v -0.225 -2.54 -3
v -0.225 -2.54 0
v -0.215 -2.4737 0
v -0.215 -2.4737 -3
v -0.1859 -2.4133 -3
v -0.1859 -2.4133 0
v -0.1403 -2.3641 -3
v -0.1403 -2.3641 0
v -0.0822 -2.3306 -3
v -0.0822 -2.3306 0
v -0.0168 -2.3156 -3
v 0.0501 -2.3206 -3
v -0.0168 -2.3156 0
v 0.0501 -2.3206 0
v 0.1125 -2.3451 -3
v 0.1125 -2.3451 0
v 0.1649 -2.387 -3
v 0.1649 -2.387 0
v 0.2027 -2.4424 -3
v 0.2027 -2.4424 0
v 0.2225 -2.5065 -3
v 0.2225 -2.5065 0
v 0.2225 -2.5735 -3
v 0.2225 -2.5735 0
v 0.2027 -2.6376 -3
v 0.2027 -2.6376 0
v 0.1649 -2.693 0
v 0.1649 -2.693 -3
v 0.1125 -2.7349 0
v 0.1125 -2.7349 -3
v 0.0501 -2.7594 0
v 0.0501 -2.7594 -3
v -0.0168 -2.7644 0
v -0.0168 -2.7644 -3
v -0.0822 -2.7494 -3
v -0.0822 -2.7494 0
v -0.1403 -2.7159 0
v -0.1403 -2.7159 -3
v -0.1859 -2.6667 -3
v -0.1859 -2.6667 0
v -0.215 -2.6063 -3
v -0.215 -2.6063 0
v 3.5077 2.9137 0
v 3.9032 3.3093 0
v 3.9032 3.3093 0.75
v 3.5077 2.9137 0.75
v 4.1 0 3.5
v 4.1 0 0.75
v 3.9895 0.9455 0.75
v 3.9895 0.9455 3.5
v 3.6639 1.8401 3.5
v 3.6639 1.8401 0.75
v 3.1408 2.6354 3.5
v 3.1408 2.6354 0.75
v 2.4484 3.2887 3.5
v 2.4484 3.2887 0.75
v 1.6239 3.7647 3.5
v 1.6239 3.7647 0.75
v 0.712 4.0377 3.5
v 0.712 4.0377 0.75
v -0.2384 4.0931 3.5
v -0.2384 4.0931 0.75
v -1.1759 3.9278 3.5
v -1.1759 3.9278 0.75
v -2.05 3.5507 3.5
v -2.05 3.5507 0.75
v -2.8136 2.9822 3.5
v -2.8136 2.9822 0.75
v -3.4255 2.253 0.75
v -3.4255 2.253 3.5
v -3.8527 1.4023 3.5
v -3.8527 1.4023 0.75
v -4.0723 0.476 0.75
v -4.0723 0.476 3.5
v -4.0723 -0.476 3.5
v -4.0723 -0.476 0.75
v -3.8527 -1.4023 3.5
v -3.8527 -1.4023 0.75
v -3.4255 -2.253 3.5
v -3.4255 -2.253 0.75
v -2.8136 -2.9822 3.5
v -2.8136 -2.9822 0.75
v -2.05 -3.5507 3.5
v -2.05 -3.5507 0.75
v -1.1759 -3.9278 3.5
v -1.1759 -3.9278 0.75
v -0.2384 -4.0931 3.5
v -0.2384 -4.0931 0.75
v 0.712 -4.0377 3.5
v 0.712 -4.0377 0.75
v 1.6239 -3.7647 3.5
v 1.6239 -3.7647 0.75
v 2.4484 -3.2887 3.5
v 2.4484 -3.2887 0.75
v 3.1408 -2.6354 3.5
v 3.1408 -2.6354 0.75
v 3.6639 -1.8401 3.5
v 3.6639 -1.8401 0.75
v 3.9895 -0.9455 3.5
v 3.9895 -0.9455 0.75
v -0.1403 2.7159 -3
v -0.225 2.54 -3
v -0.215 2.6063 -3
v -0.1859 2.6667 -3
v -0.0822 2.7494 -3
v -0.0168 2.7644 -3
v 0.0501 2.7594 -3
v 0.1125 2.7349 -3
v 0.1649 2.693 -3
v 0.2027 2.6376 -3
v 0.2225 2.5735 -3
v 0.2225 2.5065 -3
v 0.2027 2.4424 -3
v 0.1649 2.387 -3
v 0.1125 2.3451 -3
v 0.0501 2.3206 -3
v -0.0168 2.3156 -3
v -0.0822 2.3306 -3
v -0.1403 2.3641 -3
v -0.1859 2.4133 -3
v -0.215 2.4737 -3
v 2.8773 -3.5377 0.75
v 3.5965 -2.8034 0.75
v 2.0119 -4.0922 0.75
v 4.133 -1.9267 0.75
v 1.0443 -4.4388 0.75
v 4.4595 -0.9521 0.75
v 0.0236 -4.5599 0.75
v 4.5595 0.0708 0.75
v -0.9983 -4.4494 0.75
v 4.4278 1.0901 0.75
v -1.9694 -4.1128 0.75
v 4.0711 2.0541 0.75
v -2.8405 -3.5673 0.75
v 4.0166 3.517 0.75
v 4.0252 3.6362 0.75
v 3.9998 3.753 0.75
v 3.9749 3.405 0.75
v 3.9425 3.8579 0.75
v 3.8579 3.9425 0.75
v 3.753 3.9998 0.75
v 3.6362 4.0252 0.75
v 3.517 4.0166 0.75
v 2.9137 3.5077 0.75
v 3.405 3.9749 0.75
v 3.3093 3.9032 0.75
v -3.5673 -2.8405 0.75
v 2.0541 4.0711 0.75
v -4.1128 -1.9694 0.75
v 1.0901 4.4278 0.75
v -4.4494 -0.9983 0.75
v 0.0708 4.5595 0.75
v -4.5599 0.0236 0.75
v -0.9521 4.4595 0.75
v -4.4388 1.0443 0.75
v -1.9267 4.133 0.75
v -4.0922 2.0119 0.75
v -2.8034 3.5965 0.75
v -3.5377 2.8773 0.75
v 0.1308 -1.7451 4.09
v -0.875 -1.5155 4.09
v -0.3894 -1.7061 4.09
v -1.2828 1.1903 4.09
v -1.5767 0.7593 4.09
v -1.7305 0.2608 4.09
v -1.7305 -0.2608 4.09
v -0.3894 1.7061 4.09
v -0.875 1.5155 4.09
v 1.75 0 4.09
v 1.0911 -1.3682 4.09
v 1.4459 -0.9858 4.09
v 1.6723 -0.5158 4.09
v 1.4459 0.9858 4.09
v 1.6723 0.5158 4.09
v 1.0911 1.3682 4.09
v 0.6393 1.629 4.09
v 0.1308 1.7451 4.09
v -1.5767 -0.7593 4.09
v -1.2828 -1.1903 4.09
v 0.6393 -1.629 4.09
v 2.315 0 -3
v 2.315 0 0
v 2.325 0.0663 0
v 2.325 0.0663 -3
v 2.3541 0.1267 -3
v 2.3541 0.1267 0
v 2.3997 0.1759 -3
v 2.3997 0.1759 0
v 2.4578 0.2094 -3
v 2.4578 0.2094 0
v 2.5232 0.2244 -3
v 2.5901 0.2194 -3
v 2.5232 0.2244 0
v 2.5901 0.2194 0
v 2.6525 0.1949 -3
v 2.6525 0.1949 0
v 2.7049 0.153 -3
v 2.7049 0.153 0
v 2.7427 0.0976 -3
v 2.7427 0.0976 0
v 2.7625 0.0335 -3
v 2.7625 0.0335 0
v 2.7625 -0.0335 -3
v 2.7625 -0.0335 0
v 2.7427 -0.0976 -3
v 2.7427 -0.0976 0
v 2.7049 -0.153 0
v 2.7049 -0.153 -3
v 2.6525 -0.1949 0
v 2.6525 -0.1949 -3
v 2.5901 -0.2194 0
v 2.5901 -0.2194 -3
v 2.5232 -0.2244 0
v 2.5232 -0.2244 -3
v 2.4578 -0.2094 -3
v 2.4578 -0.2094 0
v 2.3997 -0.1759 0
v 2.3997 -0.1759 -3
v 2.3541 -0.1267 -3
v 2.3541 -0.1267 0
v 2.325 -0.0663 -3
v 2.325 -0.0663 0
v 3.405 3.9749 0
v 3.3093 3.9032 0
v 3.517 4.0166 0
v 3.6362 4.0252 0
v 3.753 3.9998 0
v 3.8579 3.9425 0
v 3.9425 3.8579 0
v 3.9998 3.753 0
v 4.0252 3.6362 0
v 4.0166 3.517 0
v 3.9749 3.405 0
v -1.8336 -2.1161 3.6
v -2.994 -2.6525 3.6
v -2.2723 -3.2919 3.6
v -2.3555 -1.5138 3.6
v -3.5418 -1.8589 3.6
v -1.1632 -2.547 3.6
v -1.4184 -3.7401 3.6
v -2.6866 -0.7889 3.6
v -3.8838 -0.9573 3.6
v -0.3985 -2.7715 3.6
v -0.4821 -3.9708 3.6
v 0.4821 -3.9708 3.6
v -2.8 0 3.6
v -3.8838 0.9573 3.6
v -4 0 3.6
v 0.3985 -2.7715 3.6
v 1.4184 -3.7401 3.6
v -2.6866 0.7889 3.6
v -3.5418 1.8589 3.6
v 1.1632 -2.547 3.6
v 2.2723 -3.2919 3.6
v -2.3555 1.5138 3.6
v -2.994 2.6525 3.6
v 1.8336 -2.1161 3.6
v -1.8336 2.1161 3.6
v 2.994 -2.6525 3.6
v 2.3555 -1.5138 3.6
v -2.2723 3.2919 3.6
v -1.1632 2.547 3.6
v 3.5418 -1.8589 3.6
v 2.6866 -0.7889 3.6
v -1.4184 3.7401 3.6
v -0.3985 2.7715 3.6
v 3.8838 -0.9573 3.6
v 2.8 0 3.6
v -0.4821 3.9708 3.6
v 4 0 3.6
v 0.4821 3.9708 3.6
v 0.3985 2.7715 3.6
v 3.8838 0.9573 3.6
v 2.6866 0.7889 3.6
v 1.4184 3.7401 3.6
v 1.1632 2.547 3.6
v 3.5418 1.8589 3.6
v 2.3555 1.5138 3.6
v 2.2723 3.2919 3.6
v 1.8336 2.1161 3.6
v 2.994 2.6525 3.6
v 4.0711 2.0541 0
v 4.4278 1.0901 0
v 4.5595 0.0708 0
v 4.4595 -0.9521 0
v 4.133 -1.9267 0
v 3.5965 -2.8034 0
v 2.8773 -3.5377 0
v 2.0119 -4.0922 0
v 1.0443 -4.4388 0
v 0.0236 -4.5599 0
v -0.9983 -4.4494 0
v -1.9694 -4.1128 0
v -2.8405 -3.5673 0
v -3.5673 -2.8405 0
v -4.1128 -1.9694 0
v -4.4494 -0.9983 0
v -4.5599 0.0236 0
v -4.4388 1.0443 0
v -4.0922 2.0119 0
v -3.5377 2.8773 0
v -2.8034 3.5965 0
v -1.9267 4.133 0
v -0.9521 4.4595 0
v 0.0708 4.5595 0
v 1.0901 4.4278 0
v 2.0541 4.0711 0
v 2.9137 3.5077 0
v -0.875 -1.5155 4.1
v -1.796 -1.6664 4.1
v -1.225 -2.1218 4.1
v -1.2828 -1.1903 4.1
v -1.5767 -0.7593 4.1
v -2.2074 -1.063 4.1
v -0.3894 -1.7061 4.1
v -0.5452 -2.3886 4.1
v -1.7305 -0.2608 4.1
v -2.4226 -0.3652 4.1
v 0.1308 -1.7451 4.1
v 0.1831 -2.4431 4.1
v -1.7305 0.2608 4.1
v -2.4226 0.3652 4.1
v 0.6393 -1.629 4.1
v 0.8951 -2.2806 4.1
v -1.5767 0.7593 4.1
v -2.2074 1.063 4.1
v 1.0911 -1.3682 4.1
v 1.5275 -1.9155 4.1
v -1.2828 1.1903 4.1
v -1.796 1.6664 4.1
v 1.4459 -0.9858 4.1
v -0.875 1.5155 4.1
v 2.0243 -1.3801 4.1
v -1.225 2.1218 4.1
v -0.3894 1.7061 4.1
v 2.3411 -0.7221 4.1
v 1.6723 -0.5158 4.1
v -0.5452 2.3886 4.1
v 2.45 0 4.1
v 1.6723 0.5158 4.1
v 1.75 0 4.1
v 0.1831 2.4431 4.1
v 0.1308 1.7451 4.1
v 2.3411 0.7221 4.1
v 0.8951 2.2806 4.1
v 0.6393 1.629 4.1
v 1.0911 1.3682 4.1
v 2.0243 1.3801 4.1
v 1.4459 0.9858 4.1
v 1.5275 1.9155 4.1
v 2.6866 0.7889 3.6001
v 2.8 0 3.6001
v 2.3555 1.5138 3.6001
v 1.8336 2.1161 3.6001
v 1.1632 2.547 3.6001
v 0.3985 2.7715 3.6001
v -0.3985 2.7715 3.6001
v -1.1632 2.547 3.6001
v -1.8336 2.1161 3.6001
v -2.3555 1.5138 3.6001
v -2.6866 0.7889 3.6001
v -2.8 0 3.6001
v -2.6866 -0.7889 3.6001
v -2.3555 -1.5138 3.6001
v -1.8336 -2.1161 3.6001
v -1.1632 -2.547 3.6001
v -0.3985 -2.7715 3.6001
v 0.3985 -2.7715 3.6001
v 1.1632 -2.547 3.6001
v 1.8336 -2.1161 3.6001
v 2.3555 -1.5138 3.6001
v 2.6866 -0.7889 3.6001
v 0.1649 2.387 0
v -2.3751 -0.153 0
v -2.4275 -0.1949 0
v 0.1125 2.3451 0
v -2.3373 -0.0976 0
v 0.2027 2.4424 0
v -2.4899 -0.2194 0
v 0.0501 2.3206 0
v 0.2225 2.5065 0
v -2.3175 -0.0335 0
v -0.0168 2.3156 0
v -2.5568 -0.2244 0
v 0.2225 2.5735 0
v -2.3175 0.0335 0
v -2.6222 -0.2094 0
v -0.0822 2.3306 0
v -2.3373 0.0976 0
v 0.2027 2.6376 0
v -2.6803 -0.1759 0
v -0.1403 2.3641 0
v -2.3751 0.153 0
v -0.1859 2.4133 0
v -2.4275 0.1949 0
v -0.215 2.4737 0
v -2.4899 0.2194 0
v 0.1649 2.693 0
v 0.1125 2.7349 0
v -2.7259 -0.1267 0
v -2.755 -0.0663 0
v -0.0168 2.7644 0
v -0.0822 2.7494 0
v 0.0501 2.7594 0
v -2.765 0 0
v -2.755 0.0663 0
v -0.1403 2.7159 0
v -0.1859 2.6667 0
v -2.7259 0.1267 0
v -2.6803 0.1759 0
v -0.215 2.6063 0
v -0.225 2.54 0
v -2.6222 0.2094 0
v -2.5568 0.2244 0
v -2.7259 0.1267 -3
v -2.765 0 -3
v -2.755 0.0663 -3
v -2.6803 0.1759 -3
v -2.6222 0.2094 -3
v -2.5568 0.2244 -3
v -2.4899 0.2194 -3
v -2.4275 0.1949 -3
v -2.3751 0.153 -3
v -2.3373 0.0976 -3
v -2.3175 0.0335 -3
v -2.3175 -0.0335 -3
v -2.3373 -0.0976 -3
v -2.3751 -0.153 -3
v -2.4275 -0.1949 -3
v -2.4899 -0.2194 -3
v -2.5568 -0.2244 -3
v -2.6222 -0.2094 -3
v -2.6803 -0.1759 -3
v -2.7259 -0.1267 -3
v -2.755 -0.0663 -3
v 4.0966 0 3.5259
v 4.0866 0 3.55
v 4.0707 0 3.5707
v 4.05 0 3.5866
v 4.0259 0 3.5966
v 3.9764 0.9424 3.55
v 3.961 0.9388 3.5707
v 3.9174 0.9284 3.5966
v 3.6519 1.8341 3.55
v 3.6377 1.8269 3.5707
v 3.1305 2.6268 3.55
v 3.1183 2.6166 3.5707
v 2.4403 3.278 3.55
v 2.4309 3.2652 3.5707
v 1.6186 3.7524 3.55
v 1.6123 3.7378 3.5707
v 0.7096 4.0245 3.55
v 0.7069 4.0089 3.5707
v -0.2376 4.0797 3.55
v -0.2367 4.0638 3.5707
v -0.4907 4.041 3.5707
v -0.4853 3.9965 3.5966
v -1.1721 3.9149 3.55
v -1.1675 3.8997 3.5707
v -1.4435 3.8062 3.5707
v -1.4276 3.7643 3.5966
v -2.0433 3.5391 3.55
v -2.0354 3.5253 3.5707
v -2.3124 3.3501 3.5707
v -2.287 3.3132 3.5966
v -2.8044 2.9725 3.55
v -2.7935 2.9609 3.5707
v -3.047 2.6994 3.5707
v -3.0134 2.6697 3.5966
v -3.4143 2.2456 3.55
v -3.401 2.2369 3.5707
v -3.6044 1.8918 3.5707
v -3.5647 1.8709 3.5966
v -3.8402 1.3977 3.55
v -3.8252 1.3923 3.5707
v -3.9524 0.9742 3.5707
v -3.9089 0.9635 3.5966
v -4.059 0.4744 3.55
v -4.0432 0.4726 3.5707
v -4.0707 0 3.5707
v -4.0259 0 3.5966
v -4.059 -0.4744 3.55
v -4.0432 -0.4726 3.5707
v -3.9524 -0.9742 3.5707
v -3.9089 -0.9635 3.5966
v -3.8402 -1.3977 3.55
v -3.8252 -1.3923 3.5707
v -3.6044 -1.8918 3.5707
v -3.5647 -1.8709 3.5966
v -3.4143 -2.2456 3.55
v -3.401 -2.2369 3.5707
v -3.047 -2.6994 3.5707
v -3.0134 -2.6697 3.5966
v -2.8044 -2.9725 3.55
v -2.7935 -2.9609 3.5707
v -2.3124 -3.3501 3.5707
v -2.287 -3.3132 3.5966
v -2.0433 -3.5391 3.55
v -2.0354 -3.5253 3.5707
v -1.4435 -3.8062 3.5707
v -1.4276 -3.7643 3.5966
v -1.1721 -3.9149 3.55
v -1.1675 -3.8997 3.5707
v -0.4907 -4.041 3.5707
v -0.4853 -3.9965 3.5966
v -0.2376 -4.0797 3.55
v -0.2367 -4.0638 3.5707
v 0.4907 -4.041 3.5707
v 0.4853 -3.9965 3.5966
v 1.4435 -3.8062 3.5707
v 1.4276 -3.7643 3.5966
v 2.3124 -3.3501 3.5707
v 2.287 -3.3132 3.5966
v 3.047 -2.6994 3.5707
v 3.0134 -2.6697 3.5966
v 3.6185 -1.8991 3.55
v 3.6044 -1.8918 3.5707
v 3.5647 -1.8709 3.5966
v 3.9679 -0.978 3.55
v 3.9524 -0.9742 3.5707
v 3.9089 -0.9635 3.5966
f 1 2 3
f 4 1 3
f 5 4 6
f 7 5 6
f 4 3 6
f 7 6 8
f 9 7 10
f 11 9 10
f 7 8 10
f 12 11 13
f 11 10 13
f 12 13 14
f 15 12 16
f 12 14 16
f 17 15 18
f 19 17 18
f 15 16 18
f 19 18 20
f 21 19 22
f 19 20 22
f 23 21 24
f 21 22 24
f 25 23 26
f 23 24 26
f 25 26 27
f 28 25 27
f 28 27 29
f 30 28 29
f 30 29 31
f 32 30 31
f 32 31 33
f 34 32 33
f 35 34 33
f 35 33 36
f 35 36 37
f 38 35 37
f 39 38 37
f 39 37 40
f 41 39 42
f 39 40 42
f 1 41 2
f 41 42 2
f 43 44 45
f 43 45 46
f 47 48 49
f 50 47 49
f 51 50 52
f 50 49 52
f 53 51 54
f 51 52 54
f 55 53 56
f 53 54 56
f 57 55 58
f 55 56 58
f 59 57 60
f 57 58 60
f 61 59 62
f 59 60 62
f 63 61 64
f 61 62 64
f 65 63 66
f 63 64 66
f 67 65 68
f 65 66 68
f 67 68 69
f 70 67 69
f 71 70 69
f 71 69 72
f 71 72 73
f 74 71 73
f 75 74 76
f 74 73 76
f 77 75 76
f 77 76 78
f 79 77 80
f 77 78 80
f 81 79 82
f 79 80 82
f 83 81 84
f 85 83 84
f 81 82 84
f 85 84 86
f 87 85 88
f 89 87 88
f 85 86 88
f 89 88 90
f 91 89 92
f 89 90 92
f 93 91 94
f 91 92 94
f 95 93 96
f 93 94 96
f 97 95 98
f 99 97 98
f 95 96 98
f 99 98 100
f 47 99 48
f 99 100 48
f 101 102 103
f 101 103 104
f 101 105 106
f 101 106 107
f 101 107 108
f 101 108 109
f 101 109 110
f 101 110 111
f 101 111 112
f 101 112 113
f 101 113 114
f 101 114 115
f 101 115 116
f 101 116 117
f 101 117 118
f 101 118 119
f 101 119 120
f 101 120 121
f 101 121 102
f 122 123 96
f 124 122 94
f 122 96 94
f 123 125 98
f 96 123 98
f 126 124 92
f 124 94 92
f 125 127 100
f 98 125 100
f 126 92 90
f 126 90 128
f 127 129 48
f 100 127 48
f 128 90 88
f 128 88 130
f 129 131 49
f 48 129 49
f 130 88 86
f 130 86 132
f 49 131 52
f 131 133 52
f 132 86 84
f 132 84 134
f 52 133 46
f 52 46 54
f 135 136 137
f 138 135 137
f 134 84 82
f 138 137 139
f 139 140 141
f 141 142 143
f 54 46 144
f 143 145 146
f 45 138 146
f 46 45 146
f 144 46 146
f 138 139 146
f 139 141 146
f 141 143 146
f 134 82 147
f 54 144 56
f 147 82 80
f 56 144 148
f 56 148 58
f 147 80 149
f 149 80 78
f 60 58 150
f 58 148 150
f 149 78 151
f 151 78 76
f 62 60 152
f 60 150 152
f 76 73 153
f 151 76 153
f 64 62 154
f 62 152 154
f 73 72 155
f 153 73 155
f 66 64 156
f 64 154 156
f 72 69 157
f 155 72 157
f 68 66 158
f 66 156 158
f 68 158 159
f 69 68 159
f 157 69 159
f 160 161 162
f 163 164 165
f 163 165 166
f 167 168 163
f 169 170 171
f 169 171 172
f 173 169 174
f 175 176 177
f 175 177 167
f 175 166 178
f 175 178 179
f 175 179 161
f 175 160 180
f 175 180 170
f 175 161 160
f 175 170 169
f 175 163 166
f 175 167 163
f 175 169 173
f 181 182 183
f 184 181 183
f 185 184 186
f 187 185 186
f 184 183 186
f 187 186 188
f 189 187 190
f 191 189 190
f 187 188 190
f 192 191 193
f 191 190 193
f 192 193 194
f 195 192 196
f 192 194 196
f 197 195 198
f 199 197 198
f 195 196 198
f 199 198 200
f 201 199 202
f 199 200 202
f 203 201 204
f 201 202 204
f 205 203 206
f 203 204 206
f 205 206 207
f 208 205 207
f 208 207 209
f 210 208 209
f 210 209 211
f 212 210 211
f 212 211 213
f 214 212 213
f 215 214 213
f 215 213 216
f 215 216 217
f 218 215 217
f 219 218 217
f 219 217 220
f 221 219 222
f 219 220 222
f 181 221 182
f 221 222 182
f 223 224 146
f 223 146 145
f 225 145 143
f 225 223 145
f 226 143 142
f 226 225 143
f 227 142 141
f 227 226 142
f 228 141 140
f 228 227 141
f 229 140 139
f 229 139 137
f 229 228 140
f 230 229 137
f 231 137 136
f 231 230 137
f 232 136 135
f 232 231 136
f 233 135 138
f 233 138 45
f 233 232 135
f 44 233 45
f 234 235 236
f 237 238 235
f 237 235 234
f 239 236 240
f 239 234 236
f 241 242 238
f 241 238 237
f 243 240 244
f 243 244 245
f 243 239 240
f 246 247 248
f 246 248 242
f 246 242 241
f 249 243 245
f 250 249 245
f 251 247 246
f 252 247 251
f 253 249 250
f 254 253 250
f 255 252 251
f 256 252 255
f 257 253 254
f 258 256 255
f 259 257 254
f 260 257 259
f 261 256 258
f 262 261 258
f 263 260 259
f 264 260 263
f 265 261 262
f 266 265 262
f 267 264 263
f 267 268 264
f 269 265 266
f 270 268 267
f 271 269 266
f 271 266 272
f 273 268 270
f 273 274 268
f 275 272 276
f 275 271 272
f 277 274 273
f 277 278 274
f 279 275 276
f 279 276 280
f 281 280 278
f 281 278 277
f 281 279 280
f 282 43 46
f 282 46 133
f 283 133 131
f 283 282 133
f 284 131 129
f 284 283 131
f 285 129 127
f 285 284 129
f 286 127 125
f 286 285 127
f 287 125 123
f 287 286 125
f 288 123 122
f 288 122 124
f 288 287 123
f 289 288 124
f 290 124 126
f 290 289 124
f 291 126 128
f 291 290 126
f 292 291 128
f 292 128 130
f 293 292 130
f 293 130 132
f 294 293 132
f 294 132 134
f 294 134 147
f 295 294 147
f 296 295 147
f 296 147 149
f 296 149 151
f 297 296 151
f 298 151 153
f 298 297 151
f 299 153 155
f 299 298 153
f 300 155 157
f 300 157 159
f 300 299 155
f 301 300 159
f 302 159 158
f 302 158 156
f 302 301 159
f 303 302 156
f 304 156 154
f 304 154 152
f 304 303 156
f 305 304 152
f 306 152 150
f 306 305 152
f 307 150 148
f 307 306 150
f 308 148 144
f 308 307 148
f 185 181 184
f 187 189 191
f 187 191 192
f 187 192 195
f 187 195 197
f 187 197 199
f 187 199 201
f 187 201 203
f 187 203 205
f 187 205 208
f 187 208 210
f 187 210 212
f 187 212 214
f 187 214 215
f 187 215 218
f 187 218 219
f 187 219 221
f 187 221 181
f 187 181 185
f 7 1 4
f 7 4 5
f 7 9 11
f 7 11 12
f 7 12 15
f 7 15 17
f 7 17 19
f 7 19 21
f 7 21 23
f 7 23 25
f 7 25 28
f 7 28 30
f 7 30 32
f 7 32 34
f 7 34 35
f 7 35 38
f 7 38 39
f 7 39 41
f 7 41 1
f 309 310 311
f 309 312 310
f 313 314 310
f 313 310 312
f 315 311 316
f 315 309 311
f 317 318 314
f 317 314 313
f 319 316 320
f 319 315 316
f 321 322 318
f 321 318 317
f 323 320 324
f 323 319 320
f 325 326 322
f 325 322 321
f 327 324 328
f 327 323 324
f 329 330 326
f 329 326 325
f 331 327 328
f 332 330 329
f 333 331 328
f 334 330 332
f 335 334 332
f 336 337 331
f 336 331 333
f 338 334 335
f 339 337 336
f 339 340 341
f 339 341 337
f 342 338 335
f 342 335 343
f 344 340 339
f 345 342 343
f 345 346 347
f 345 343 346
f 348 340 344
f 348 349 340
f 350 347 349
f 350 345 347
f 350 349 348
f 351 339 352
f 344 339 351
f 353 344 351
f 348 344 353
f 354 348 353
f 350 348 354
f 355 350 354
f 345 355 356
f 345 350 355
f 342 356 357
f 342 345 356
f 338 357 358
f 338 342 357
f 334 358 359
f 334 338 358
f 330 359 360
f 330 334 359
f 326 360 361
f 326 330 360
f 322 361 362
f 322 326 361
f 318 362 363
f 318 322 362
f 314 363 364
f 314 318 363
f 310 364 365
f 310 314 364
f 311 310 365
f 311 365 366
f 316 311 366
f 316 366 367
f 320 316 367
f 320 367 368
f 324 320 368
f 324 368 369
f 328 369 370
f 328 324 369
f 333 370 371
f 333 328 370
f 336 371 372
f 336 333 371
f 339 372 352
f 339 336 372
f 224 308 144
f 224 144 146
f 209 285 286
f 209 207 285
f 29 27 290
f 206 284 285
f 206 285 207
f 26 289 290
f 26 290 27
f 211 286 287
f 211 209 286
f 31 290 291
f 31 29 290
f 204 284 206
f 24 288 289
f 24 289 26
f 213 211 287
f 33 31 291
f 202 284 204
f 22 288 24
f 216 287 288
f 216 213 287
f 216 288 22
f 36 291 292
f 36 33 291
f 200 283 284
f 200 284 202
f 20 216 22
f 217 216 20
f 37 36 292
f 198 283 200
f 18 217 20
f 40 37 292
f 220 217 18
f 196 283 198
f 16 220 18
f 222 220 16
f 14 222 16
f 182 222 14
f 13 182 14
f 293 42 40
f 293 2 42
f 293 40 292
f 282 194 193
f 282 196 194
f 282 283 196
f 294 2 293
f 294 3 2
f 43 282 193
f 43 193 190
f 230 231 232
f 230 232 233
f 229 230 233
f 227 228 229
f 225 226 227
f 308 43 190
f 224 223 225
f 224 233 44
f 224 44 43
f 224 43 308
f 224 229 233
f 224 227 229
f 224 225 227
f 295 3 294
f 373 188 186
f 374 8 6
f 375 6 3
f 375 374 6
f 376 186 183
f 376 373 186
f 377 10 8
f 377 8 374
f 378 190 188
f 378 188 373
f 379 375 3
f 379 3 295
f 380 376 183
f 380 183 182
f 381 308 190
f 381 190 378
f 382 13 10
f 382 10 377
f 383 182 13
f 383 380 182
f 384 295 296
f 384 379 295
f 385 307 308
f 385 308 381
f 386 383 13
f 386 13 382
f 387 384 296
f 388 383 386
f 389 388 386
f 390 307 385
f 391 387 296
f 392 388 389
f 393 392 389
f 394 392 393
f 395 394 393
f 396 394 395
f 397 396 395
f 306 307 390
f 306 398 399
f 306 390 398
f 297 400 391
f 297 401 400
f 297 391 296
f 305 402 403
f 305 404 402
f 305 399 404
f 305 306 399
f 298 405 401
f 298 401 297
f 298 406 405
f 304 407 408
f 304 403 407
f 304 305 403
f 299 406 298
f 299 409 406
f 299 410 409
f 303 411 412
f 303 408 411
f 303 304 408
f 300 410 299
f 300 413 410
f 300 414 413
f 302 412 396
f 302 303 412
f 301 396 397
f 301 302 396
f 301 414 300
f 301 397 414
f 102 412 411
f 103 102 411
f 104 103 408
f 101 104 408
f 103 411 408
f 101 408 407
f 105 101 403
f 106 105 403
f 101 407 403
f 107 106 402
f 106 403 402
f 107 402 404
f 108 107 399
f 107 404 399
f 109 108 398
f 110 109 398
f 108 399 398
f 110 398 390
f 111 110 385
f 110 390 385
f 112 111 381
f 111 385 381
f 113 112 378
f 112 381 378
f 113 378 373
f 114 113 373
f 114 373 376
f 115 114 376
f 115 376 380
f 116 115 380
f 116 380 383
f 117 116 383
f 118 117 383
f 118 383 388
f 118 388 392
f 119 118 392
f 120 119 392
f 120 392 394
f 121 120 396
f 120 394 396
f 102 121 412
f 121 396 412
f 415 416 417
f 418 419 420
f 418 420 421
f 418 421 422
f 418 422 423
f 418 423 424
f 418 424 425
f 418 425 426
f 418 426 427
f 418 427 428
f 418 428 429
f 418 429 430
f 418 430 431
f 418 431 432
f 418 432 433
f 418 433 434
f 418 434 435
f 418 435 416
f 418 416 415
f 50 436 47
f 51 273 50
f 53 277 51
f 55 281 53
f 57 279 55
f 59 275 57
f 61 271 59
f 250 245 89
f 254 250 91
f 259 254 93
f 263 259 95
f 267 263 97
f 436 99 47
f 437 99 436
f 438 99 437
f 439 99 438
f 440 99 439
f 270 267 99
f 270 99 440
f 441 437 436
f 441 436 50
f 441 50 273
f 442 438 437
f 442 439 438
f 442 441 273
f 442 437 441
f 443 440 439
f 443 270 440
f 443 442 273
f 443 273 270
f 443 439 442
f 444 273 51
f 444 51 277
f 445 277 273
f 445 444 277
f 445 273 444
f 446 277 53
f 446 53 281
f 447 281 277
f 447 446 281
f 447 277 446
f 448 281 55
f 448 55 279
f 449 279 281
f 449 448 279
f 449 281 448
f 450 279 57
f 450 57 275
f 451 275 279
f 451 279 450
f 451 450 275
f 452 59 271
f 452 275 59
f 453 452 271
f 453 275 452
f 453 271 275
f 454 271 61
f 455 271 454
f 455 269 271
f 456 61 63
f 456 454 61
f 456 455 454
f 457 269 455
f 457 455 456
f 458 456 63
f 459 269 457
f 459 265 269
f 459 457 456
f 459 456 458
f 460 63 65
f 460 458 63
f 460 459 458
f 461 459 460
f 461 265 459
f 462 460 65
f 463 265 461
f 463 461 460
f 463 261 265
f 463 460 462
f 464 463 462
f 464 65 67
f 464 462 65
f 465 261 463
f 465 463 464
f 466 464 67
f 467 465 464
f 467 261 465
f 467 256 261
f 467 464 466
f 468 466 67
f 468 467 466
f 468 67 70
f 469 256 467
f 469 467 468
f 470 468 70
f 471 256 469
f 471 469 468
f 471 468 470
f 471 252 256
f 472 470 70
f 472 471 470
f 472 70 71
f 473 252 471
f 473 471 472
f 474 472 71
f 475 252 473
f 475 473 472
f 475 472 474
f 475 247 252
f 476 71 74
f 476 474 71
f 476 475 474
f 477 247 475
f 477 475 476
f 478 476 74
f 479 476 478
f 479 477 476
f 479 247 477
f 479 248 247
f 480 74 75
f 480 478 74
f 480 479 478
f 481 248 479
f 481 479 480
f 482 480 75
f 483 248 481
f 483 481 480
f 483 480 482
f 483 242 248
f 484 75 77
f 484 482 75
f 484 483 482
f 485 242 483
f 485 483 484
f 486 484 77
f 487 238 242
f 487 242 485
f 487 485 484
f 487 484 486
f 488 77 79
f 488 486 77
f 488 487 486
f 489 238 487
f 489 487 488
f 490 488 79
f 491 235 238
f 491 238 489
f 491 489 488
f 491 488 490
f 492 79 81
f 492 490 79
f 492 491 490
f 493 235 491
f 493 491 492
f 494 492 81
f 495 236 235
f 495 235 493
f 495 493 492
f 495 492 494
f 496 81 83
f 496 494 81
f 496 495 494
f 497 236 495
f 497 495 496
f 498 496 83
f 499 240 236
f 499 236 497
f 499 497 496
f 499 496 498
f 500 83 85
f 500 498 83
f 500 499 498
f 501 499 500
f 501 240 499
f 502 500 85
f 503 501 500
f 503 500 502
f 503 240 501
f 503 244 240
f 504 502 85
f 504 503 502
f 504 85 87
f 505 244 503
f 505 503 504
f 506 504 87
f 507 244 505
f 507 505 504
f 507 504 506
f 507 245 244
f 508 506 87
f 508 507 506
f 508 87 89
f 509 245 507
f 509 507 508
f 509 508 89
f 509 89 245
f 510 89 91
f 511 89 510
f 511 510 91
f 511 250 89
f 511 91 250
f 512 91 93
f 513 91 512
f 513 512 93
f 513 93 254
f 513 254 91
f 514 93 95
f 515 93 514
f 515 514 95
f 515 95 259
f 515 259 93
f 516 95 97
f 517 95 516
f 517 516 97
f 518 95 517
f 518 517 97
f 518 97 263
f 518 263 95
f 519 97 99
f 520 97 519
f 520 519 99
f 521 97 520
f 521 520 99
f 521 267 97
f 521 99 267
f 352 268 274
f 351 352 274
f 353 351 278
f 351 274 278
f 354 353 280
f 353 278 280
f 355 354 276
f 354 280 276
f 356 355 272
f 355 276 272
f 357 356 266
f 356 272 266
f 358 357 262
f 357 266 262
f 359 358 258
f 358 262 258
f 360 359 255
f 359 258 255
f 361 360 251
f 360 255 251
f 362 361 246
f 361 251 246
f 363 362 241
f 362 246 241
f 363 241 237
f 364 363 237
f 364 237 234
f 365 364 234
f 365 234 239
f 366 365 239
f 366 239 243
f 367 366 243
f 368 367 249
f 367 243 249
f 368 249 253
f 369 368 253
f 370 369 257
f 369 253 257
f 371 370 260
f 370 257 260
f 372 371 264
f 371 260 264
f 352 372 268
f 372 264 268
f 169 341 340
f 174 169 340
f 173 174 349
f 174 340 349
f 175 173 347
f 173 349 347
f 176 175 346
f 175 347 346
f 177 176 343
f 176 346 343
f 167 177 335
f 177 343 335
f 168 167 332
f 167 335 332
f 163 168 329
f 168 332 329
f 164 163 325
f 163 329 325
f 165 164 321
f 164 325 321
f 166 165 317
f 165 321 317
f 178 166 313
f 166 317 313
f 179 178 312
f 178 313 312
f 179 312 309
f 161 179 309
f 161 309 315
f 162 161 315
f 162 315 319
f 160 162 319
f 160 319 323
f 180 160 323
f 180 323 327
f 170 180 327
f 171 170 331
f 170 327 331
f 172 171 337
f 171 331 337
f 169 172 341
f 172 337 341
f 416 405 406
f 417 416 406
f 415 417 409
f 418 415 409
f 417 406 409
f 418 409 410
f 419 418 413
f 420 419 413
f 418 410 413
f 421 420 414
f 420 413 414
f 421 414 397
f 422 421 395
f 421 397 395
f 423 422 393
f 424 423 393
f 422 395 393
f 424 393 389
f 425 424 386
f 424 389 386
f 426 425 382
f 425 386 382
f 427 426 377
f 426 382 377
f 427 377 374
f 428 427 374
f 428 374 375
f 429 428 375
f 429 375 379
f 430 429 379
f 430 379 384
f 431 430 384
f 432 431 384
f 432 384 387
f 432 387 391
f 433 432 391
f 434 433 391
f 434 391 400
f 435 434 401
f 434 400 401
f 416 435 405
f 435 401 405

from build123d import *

# Parameters (mm, degrees)
EXTRUDE_1_DEPTH     = 0.75
SKETCH_2_R          = 4.1
EXTRUDE_2_DEPTH     = 2.85
SKETCH_3_R          = 2.8
EXTRUDE_3_DEPTH     = 0.5
SKETCH_4_R          = 1.75
CUT_EXTRUDE_1_DEPTH = 0.01
FILLET_1_R          = 0.1
CHAMFER_1_SIZE2     = 0.350103769
CHAMFER_1_SIZE      = 0.5
SKETCH_5_R          = 0.225
EXTRUDE_4_DEPTH     = 3


with BuildPart() as part:
    # Эскиз1 → Бобышка-Вытянуть1 (new body)
    with BuildSketch(Plane.XY):
        with BuildLine():
            Line((2.91371601, 3.507685706), (3.309259736, 3.903229432))
            ThreePointArc((3.309259736, 3.903229432), (3.903229432, 3.903229432), (3.903229432, 3.309259736))
            Line((3.903229432, 3.309259736), (3.507685706, 2.91371601))
            ThreePointArc((3.507685706, 2.91371601), (-3.224406922, -3.224406922), (2.91371601, 3.507685706))
        make_face()
    extrude(amount=EXTRUDE_1_DEPTH)

    # Эскиз2 → Бобышка-Вытянуть2 (add)
    with BuildSketch(Plane.XY.offset(0.75)):
        Circle(SKETCH_2_R)
    extrude(amount=EXTRUDE_2_DEPTH)

    # Эскиз3 → Бобышка-Вытянуть3 (add)
    with BuildSketch(Plane.XY.offset(3.6)):
        Circle(SKETCH_3_R)
    extrude(amount=EXTRUDE_3_DEPTH)

    # Эскиз4 → Вырез-Вытянуть1 (cut)
    with BuildSketch(Plane.XY.offset(4.1)):
        Circle(SKETCH_4_R)
    extrude(amount=-CUT_EXTRUDE_1_DEPTH, mode=Mode.SUBTRACT)

    # Скругление1
    fillet_1_edges = [part.edges().sort_by_distance(p)[0] for p in [
        (-4.1, 0, 3.6),
    ]]
    fillet(fillet_1_edges, radius=FILLET_1_R)

    # Фаска1
    chamfer_1_edges = [part.edges().sort_by_distance(p)[0] for p in [
        (-2.8, 0, 4.1),
    ]]
    chamfer_1_side = [part.faces().sort_by_distance(p)[0] for p in [
        (-2.8, 0, 4.092997925),
    ]]
    chamfer(chamfer_1_edges, length=CHAMFER_1_SIZE - 0.0001, length2=CHAMFER_1_SIZE2 - 0.0001, reference=chamfer_1_side[0])  # a hair under: the kernel refuses the full size

    # Эскиз5 → Бобышка-Вытянуть4 (add)
    with BuildSketch(Plane(origin=(0, 0, 0), x_dir=(-1, 0, 0), z_dir=(0, 0, -1))):
        with Locations((-2.54, 0)):
            Circle(SKETCH_5_R)
        with Locations((0, -2.54)):
            Circle(SKETCH_5_R)
        with Locations((2.54, 0)):
            Circle(SKETCH_5_R)
        with Locations((0, 2.54)):
            Circle(SKETCH_5_R)
    extrude(amount=EXTRUDE_4_DEPTH)


solid = part.part
